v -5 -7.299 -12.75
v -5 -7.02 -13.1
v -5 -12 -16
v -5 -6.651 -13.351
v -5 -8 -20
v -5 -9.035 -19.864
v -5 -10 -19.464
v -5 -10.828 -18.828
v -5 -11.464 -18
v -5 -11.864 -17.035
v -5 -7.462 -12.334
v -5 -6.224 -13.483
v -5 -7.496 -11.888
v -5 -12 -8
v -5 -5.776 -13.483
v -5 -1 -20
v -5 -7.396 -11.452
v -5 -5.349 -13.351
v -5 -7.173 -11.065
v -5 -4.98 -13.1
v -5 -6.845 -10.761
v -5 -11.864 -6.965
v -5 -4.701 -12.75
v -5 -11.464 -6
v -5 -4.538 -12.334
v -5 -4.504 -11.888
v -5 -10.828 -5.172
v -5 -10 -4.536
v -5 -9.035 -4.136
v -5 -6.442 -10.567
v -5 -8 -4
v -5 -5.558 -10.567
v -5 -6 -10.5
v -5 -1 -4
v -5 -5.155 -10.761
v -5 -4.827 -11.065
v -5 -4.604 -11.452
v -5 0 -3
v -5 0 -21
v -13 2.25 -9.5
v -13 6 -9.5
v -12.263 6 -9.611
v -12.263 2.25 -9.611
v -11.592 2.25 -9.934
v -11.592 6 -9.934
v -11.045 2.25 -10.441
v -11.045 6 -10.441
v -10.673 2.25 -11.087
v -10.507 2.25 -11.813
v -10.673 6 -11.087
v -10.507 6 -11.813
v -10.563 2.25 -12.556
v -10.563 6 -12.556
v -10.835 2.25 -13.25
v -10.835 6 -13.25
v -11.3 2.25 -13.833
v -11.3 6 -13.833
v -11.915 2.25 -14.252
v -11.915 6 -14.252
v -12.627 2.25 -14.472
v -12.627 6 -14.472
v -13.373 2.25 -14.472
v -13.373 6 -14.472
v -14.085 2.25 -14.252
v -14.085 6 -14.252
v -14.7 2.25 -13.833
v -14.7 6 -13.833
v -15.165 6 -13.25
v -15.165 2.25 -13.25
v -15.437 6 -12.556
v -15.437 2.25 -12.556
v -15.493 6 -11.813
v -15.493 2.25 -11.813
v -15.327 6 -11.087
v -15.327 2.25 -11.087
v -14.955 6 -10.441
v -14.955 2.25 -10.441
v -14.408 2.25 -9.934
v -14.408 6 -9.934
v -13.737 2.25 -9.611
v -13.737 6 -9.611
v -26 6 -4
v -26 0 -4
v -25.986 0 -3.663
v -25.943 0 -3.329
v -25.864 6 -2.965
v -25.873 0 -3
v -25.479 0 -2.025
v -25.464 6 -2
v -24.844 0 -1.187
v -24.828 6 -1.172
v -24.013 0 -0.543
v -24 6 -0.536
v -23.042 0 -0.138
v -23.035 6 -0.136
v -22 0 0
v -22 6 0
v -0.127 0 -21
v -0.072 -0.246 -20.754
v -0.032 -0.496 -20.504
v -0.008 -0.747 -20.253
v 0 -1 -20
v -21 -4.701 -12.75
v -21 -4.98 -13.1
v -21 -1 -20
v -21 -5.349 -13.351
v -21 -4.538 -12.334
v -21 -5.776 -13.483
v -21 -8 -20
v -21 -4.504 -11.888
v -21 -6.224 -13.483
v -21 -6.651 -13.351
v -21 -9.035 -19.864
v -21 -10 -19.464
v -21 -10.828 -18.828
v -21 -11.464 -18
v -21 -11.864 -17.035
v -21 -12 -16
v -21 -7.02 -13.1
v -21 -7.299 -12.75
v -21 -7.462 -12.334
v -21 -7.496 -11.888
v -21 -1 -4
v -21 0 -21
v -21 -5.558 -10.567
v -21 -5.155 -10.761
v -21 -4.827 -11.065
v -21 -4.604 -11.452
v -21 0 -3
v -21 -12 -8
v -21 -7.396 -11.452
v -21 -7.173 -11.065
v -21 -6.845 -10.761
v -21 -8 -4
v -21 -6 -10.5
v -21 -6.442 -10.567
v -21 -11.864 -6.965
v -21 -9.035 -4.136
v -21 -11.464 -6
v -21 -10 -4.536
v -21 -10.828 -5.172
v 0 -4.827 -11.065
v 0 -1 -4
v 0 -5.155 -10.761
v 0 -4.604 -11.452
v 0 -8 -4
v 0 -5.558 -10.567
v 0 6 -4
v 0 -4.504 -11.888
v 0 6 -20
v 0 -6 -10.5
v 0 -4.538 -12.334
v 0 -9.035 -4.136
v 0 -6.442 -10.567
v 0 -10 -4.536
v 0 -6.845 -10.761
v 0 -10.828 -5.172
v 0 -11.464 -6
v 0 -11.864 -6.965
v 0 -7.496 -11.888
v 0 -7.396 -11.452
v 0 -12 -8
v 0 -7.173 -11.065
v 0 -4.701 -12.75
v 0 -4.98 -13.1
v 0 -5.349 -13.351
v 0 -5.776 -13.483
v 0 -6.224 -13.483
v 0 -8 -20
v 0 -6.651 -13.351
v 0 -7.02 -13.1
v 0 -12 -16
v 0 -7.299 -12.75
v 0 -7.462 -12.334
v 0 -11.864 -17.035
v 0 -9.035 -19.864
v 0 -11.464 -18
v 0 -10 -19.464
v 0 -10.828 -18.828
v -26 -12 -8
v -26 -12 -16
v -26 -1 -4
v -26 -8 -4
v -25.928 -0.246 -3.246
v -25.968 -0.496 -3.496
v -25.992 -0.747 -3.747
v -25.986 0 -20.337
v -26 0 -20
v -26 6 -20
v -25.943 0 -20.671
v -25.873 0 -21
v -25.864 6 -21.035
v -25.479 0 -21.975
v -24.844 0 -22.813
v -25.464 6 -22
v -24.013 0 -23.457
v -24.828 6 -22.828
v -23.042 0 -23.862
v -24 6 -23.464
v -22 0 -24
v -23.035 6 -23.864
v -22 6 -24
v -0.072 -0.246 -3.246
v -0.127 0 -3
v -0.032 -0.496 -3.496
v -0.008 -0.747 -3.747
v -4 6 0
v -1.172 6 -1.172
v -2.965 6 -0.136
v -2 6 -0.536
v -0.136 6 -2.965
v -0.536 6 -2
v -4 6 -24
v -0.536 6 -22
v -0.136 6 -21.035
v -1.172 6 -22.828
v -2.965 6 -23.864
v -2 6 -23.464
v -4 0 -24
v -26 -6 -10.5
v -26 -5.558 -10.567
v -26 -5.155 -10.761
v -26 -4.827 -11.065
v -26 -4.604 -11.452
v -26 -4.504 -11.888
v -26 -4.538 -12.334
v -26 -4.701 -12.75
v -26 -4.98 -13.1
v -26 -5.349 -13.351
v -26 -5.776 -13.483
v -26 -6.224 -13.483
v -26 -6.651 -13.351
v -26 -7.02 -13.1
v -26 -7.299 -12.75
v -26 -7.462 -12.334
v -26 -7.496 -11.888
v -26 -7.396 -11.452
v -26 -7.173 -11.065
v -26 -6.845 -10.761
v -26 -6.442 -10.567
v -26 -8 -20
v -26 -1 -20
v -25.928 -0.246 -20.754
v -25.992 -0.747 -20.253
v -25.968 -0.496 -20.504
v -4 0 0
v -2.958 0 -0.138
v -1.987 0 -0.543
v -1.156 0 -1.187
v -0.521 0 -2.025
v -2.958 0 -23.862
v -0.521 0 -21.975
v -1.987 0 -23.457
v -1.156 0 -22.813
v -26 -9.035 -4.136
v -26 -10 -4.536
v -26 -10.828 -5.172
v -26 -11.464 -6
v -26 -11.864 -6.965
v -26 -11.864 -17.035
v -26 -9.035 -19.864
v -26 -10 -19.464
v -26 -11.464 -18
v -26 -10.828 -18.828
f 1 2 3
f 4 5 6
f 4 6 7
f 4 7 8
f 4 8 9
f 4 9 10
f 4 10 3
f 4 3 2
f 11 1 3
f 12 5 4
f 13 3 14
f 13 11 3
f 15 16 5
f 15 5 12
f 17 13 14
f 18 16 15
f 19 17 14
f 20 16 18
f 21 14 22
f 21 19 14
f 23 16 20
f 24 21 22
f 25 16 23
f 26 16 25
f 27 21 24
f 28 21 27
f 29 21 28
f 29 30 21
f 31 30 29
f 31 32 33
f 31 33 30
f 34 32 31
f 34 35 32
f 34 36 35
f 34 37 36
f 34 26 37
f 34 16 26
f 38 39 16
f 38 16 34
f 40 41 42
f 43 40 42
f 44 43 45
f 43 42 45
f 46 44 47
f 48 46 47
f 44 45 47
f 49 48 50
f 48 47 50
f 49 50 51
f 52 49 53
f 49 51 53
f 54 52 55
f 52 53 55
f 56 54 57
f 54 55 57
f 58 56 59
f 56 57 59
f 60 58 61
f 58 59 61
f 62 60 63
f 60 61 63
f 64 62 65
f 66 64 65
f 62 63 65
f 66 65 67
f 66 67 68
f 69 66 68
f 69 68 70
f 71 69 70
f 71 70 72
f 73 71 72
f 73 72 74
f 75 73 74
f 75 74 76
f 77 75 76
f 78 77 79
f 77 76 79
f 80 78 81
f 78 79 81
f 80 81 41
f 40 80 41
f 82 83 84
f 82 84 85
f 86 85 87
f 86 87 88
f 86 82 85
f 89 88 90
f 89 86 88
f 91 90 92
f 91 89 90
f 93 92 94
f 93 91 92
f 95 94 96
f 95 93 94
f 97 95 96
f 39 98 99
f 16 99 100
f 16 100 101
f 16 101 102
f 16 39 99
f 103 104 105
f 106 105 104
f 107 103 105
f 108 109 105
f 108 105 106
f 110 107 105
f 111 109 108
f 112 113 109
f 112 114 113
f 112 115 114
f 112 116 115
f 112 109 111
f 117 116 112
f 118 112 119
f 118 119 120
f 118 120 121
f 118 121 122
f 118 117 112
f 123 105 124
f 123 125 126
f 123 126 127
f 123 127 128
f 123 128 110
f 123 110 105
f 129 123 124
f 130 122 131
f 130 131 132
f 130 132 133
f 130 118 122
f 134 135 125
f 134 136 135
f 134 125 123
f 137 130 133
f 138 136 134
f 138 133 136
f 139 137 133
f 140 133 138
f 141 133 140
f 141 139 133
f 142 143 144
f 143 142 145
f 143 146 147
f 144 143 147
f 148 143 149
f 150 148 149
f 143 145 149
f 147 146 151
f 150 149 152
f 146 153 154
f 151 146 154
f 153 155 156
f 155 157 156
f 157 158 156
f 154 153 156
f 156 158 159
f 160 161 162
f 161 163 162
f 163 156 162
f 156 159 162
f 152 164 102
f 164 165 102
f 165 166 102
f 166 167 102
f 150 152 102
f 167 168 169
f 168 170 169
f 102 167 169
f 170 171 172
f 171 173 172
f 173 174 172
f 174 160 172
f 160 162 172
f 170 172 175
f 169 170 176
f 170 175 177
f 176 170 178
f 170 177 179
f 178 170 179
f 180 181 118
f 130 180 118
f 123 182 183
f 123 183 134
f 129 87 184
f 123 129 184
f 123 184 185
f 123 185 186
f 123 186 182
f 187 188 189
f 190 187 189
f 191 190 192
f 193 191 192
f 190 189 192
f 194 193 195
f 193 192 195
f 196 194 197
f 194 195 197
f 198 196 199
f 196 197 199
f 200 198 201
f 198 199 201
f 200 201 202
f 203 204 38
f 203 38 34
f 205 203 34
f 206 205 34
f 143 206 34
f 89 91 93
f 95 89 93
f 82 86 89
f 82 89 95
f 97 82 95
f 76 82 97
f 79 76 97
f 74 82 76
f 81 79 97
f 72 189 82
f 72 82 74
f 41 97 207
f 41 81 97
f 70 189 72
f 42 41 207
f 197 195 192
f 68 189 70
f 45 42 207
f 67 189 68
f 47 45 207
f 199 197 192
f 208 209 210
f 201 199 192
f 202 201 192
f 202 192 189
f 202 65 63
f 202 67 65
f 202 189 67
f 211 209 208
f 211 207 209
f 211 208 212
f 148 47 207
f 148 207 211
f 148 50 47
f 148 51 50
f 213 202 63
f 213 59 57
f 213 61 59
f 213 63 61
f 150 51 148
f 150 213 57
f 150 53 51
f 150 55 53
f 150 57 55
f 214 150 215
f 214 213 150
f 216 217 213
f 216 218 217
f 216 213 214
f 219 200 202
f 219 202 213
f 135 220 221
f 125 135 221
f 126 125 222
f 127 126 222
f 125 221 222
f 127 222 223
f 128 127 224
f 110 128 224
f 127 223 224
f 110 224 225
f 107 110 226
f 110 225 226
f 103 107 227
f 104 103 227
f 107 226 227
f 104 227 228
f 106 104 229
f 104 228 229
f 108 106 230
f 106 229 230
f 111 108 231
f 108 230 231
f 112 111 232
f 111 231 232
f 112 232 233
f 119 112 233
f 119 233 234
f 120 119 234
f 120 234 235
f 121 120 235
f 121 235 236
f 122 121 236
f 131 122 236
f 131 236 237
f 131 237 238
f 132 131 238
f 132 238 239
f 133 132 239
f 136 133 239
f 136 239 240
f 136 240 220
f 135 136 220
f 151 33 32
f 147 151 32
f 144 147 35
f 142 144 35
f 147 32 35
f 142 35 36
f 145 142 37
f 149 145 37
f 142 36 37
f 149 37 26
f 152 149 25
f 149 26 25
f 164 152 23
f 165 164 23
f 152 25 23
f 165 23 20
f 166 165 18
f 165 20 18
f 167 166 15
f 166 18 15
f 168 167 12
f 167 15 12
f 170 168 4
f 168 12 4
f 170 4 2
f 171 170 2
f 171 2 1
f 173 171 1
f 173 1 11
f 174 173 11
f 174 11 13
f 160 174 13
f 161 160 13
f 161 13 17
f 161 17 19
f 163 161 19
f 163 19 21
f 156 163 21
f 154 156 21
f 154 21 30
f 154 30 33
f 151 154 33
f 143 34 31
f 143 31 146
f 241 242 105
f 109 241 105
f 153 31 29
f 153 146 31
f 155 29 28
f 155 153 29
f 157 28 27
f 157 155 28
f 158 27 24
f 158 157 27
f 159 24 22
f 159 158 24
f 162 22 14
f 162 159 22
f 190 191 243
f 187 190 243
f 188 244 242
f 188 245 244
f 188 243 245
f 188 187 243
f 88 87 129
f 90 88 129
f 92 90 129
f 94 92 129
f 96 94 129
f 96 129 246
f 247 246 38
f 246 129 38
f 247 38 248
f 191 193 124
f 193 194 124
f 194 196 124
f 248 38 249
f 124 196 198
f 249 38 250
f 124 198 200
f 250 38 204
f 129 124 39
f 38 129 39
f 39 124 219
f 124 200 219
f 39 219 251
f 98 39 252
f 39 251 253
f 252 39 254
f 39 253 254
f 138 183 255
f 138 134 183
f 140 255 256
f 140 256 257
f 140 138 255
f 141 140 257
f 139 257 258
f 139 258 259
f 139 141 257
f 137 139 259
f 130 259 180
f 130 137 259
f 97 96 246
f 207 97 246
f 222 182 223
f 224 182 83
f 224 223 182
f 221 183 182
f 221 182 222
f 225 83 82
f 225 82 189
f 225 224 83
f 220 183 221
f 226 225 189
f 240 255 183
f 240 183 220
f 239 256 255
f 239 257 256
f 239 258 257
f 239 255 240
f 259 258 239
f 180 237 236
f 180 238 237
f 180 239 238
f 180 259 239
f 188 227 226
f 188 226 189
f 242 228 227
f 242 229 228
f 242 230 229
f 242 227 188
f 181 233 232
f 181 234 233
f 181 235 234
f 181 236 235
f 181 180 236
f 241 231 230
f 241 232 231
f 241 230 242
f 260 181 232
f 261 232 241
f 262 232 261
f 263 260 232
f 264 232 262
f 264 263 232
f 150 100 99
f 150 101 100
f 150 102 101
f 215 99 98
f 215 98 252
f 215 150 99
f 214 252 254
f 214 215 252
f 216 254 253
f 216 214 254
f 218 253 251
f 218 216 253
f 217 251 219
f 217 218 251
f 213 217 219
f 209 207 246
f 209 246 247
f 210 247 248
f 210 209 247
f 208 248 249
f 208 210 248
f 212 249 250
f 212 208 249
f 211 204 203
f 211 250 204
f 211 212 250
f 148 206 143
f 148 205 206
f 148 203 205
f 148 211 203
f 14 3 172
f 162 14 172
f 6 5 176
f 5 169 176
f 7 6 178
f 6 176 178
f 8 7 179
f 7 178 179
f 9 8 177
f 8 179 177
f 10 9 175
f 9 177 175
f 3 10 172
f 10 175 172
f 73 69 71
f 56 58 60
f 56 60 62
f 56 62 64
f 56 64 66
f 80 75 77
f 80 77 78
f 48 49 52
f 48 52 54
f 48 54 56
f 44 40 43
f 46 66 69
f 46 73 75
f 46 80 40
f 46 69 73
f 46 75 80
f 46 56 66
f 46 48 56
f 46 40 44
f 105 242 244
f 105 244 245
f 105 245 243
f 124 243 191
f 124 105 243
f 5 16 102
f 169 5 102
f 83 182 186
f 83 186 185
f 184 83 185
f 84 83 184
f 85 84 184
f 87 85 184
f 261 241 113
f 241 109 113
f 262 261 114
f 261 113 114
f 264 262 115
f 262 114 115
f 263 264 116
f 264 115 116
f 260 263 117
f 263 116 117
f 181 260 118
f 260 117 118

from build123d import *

# Parameters (mm, degrees)
SKETCH_1_W          = 26
SKETCH_1_H          = 24
EXTRUDE_1_DEPTH     = 6
SKETCH_2_W          = 5
SKETCH_2_H          = 16
EXTRUDE_2_DEPTH     = 12
SKETCH_3_R          = 1.5
CUT_EXTRUDE_1_DEPTH = 80
SKETCH_4_R          = 2.5
CUT_EXTRUDE_2_DEPTH = 3.75
FILLET_1_R          = 4
FILLET_2_R          = 4
CHAMFER_1_SIZE      = 1


with BuildPart() as part:
    # 草图1 → 凸台-拉伸1 (new body)
    with BuildSketch(Plane(origin=(0, 0, 0), x_dir=(1, 0, 0), z_dir=(0, 1, 0))):
        with Locations((-13, 12)):
            Rectangle(SKETCH_1_W, SKETCH_1_H)
    extrude(amount=EXTRUDE_1_DEPTH)

    # 草图2 → 凸台-拉伸2 (add)
    with BuildSketch(Plane.XZ):
        with Locations((-23.5, -12)):
            Rectangle(SKETCH_2_W, SKETCH_2_H)
        with Locations((-2.5, -12)):
            Rectangle(SKETCH_2_W, SKETCH_2_H)
    extrude(amount=EXTRUDE_2_DEPTH)

    # 草图3 → 切除-拉伸1 (cut)
    with BuildSketch(Plane.ZY.offset(26)):
        with Locations((-12, -6)):
            Circle(SKETCH_3_R)
    extrude(amount=-CUT_EXTRUDE_1_DEPTH, mode=Mode.SUBTRACT)

    # 草图4 → 切除-拉伸2 (cut)
    with BuildSketch(Plane(origin=(0, 6, 0), x_dir=(1, 0, 0), z_dir=(0, 1, 0))):
        with Locations(Location((-13, 12, 0), (0, 0, 270))):
            Circle(SKETCH_4_R)
    extrude(amount=-CUT_EXTRUDE_2_DEPTH, mode=Mode.SUBTRACT)

    # 圆角1
    fillet_1_edges = [part.edges().sort_by_distance(p)[0] for p in [
        (-26, 3, -24),
        (0, 3, -24),
        (0, 3, 0),
        (-26, 3, 0),
    ]]
    fillet(fillet_1_edges, radius=FILLET_1_R)

    # 圆角2
    fillet_2_edges = [part.edges().sort_by_distance(p)[0] for p in [
        (-23.5, -12, -20),
        (-23.5, -12, -4),
        (-2.5, -12, -4),
        (-2.5, -12, -20),
    ]]
    fillet(fillet_2_edges, radius=FILLET_2_R)

    # 倒角1
    # the kernel refuses this chamfer: 1 mm, written as the material it adds along each edge
    with BuildSketch(Plane(origin=(-21, 0, -20), x_dir=(0, -0.9996219169112968, 0.02749587661058563), z_dir=(-1, 0, 0))) as chamfer_1_piece_1_section:
        Polygon((CHAMFER_1_SIZE * 0.999621916911, -CHAMFER_1_SIZE * 0.0274958766106), (-CHAMFER_1_SIZE * 0.0274958766106, -CHAMFER_1_SIZE * 0.999621916911), (0, 0), align=None)
    chamfer_1_piece_1 = extrude(amount=7.571682988, mode=Mode.PRIVATE)
    chamfer_1_piece_1 = chamfer_1_piece_1 & Plane(origin=(-22, -0.333896309, -20), x_dir=(-1, 0, 0), z_dir=(0, 1, 0)) * Cylinder(4, 20, mode=Mode.PRIVATE)
    add(chamfer_1_piece_1)
    with BuildSketch(Plane(origin=(-28.571682988, 0, -4), x_dir=(0, 0.02749587661058636, 0.9996219169112968), z_dir=(1, 0, 0))) as chamfer_1_piece_2_section:
        Polygon((CHAMFER_1_SIZE * 0.999621916911, CHAMFER_1_SIZE * 0.0274958766106), (-CHAMFER_1_SIZE * 0.0274958766106, CHAMFER_1_SIZE * 0.999621916911), (0, 0), align=None)
    chamfer_1_piece_2 = extrude(amount=7.571682988, mode=Mode.PRIVATE)
    chamfer_1_piece_2 = chamfer_1_piece_2 & Plane(origin=(-22, -0.333896309, -4), x_dir=(0, 0, 1), z_dir=(0, 1, 0)) * Cylinder(4, 20, mode=Mode.PRIVATE)
    add(chamfer_1_piece_2)
    with BuildSketch(Plane(origin=(2.571682988, 0, -4), x_dir=(0, 0.02749587661058636, 0.9996219169112968), z_dir=(-1, 0, 0))) as chamfer_1_piece_3_section:
        Polygon((CHAMFER_1_SIZE * 0.999621916911, -CHAMFER_1_SIZE * 0.0274958766106), (-CHAMFER_1_SIZE * 0.0274958766106, -CHAMFER_1_SIZE * 0.999621916911), (0, 0), align=None)
    chamfer_1_piece_3 = extrude(amount=7.571682988, mode=Mode.PRIVATE)
    chamfer_1_piece_3 = chamfer_1_piece_3 & Plane(origin=(-4, -0.333896309, -4), x_dir=(0, 0, 1), z_dir=(0, 1, 0)) * Cylinder(4, 20, mode=Mode.PRIVATE)
    add(chamfer_1_piece_3)
    with BuildSketch(Plane(origin=(-5, 0, -20), x_dir=(0, 0.02749587661058639, -0.9996219169112968), z_dir=(1, 0, 0))) as chamfer_1_piece_4_section:
        Polygon((CHAMFER_1_SIZE * 0.999621916911, -CHAMFER_1_SIZE * 0.0274958766106), (-CHAMFER_1_SIZE * 0.0274958766106, -CHAMFER_1_SIZE * 0.999621916911), (0, 0), align=None)
    chamfer_1_piece_4 = extrude(amount=7.571682988, mode=Mode.PRIVATE)
    chamfer_1_piece_4 = chamfer_1_piece_4 & Plane(origin=(-4, -0.333896309, -20), x_dir=(1, 0, 0), z_dir=(0, 1, 0)) * Cylinder(4, 20, mode=Mode.PRIVATE)
    add(chamfer_1_piece_4)


solid = part.part
